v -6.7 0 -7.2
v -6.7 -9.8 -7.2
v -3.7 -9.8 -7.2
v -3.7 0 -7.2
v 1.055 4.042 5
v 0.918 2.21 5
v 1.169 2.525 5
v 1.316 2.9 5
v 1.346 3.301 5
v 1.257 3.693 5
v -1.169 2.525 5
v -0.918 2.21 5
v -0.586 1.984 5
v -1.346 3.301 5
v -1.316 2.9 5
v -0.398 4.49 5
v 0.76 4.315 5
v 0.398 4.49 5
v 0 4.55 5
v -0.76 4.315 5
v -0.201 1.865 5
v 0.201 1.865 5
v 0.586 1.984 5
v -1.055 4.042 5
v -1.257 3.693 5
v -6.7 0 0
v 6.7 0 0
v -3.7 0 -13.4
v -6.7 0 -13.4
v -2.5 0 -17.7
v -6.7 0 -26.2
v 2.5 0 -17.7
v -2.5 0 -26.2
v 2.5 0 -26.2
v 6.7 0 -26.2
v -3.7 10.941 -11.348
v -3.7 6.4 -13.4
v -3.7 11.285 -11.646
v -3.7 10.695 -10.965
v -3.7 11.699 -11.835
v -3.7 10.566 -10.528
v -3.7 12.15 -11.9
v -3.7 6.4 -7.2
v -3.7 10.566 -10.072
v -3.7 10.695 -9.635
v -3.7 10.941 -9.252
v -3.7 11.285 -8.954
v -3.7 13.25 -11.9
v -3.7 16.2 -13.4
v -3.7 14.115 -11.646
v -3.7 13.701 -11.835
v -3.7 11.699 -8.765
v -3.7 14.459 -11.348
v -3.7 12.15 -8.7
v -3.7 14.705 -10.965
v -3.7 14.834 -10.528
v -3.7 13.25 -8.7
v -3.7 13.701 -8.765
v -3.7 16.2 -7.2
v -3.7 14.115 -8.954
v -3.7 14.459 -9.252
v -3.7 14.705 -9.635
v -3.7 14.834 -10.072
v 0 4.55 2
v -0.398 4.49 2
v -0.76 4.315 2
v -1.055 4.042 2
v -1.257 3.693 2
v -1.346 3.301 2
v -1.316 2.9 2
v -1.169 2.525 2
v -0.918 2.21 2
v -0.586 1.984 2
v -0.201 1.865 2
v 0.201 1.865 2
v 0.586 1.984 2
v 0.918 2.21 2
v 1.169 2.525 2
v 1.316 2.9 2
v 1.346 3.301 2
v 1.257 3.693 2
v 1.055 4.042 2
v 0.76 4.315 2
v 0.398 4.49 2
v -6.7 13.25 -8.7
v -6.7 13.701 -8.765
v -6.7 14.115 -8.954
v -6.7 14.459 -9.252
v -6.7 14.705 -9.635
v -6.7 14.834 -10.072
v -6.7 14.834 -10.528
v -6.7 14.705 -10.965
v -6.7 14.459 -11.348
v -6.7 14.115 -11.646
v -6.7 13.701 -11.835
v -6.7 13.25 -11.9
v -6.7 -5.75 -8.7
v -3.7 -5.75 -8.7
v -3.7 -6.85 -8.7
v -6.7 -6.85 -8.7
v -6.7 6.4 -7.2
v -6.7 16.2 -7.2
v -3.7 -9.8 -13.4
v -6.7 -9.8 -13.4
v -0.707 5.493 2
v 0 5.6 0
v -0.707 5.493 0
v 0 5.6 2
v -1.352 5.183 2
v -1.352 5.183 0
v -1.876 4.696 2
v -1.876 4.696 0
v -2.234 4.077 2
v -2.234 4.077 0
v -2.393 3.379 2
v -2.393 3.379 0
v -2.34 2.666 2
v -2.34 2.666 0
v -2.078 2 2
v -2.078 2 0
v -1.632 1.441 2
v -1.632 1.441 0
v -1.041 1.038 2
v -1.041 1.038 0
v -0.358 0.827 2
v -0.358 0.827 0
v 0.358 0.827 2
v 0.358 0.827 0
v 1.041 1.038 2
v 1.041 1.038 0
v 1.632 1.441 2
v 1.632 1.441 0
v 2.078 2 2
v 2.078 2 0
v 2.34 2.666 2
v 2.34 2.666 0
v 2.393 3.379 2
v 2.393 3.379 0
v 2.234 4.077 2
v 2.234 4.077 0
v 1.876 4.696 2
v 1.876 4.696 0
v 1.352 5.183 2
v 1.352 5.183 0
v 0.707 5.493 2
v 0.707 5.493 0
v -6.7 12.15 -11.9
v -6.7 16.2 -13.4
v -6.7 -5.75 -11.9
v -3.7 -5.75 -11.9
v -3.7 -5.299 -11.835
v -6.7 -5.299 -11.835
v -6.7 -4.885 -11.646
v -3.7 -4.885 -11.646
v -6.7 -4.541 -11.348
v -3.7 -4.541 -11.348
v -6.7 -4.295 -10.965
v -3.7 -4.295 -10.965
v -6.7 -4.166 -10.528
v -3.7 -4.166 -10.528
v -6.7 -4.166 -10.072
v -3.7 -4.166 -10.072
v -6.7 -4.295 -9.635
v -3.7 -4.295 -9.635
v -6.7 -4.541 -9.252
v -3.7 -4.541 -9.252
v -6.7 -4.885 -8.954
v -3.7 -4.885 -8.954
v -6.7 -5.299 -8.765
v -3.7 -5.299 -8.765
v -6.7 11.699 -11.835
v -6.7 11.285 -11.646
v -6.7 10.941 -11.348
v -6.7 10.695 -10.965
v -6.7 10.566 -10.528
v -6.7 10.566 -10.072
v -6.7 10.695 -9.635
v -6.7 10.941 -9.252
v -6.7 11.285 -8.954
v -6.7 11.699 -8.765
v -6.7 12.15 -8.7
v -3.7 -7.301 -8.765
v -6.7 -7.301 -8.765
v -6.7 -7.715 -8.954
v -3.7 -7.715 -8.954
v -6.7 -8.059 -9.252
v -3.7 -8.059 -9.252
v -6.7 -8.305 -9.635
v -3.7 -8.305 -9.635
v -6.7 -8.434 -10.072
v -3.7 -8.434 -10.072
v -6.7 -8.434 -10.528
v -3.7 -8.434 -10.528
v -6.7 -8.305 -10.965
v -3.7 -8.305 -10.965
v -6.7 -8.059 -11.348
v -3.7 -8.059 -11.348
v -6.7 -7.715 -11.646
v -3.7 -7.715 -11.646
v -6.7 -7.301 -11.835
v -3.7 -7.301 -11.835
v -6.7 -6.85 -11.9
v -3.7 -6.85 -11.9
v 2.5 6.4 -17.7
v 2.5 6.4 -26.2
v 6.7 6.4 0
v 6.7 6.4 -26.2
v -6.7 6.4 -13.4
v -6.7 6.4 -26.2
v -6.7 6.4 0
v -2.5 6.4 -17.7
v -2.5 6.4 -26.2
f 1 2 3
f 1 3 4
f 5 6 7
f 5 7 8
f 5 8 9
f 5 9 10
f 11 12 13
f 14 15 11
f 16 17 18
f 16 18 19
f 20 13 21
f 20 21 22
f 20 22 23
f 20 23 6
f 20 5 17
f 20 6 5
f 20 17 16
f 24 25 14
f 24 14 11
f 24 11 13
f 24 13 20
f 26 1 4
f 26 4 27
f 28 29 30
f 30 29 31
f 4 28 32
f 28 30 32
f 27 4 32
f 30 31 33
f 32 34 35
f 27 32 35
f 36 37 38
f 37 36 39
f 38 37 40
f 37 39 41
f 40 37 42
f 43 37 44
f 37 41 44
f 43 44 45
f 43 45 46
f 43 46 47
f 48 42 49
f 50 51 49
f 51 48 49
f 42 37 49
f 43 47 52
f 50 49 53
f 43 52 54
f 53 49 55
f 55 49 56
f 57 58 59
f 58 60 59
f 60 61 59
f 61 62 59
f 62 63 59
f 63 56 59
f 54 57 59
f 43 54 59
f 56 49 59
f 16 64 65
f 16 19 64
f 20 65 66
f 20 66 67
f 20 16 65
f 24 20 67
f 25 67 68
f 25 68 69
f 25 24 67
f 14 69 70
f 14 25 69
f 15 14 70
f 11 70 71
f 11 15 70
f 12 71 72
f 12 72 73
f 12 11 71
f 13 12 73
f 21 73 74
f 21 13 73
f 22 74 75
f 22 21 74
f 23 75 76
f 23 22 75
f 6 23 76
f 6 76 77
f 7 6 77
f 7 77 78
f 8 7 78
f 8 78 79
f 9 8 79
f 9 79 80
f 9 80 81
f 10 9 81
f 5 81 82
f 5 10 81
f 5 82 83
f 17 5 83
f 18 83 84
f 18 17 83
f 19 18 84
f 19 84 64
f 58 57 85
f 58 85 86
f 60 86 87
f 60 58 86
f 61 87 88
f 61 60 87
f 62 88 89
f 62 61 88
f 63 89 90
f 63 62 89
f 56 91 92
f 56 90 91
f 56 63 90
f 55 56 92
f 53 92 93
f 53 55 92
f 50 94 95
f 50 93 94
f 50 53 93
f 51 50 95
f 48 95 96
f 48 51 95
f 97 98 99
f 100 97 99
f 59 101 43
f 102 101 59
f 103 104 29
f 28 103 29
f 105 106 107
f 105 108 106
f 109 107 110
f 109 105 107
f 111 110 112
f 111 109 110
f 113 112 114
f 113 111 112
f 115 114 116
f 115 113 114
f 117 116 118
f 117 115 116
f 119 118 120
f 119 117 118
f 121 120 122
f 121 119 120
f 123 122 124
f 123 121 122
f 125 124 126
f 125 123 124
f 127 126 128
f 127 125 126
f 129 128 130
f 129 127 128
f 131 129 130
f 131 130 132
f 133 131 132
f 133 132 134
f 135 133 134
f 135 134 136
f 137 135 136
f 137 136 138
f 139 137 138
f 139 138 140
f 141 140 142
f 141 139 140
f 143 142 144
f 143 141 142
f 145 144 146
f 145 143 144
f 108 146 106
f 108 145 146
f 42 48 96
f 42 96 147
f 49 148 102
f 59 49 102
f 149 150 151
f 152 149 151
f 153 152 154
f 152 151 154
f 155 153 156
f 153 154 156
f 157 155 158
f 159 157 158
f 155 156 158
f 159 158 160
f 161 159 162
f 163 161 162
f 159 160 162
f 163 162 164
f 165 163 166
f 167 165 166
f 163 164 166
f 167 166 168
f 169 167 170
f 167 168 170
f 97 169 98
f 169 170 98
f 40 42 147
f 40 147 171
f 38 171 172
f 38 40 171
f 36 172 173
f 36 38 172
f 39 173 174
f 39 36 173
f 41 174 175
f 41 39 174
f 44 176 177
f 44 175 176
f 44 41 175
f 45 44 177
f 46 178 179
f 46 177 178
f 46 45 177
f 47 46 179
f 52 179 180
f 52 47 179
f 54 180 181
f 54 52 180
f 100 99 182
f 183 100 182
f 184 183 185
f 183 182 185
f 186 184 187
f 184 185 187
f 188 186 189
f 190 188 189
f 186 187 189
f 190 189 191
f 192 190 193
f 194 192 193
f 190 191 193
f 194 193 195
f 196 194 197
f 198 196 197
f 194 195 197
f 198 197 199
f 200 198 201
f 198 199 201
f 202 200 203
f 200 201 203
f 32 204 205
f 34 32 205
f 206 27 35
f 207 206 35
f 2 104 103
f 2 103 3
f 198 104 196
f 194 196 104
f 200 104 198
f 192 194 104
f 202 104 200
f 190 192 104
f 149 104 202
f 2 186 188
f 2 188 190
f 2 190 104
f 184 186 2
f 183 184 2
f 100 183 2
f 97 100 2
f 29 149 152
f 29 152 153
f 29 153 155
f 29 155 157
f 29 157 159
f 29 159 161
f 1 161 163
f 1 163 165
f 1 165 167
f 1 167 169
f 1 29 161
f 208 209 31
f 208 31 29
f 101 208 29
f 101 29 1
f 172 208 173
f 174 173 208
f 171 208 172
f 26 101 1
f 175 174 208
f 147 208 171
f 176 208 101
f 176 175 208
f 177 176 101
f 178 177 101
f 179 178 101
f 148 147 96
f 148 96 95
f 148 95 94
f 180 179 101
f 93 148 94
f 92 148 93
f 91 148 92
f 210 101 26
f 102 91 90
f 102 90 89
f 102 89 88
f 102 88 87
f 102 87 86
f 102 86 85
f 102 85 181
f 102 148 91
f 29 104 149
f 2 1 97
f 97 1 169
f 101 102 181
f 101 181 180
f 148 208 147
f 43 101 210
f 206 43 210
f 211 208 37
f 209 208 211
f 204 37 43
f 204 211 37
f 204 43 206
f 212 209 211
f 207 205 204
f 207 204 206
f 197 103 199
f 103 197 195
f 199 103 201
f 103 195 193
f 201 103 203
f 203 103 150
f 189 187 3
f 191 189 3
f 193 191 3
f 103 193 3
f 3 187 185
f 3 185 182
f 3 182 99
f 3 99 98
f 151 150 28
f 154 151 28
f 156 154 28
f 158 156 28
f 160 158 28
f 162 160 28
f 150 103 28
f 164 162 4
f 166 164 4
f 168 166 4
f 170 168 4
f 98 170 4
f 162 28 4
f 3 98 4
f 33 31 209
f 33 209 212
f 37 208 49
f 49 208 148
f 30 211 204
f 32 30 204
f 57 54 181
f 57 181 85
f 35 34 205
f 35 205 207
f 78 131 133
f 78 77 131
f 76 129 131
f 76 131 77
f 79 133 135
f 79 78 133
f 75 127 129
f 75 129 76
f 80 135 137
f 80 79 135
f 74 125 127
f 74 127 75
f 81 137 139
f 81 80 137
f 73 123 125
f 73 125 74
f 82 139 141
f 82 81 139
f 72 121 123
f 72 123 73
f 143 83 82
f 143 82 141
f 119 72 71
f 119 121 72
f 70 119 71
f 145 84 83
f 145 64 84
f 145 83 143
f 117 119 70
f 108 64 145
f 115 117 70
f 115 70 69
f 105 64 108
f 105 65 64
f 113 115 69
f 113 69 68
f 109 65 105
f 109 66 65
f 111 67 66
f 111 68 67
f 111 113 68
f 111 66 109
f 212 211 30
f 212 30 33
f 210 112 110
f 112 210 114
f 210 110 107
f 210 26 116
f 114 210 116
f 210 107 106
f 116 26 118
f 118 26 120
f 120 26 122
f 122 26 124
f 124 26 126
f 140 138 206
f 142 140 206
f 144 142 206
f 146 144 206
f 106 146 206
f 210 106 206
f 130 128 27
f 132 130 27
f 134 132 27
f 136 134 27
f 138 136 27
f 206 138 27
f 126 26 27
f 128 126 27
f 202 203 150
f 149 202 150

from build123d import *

# Parameters (mm, degrees)
SKETCH1_W           = 13.4
SKETCH1_H           = 26.2
BOSS_EXTRUDE1_DEPTH = 6.4
SKETCH2_W           = 5
SKETCH2_H           = 8.5
CUT_EXTRUDE1_DEPTH  = 6.4
SKETCH3_W           = 6.2
SKETCH3_H           = 26
BOSS_EXTRUDE2_DEPTH = 3
CUT_EXTRUDE2_DEPTH  = 4


with BuildPart() as part:
    # Sketch1 → Boss-Extrude1 (new body)
    with BuildSketch(Plane(origin=(0, 0, 0), x_dir=(1, 0, 0), z_dir=(0, 1, 0))):
        with Locations((0, 13.1)):
            Rectangle(SKETCH1_W, SKETCH1_H)
    extrude(amount=BOSS_EXTRUDE1_DEPTH)

    # Sketch2 → Cut-Extrude1 (cut)
    with BuildSketch(Plane(origin=(0, 6.4, 0), x_dir=(1, 0, 0), z_dir=(0, 1, 0))):
        with Locations((0, 21.95)):
            Rectangle(SKETCH2_W, SKETCH2_H)
    extrude(amount=-CUT_EXTRUDE1_DEPTH, mode=Mode.SUBTRACT)

    # Sketch3 → Boss-Extrude2 (add)
    with BuildSketch(Plane.ZY.offset(6.7)):
        with Locations((-10.3, 3.2)):
            Rectangle(SKETCH3_W, SKETCH3_H)
    extrude(amount=-BOSS_EXTRUDE2_DEPTH)

    # Sketch4 → Cut-Extrude2 (cut, through all)
    with BuildSketch(Plane(origin=(-3.7, 0, 0), x_dir=(0, 0, -1), z_dir=(1, 0, 0))):
        with BuildLine():
            Line((11.9, 13.25), (11.9, 12.15))
            ThreePointArc((11.9, 12.15), (10.3, 10.55), (8.7, 12.15))
            Line((8.7, 12.15), (8.7, 13.25))
            ThreePointArc((8.7, 13.25), (10.3, 14.85), (11.9, 13.25))
        make_face()
        with BuildLine():
            Line((11.9, -6.85), (11.9, -5.75))
            ThreePointArc((11.9, -5.75), (10.3, -4.15), (8.7, -5.75))
            Line((8.7, -5.75), (8.7, -6.85))
            ThreePointArc((8.7, -6.85), (10.3, -8.45), (11.9, -6.85))
        make_face()
    extrude(amount=-CUT_EXTRUDE2_DEPTH, mode=Mode.SUBTRACT)

    # Sketch5 → Revolve1 (revolve)
    with BuildSketch(Plane(origin=(0, 0, 0), x_dir=(0, 0, -1), z_dir=(1, 0, 0))):
        Polygon((0, 3.2), (0, 5.6), (-2, 5.6), (-2, 4.55), (-5, 4.55), (-5, 3.2), align=None)
    revolve(axis=Axis((0, 3.2, -27.354495769), (0, 0, 1)))


solid = part.part
